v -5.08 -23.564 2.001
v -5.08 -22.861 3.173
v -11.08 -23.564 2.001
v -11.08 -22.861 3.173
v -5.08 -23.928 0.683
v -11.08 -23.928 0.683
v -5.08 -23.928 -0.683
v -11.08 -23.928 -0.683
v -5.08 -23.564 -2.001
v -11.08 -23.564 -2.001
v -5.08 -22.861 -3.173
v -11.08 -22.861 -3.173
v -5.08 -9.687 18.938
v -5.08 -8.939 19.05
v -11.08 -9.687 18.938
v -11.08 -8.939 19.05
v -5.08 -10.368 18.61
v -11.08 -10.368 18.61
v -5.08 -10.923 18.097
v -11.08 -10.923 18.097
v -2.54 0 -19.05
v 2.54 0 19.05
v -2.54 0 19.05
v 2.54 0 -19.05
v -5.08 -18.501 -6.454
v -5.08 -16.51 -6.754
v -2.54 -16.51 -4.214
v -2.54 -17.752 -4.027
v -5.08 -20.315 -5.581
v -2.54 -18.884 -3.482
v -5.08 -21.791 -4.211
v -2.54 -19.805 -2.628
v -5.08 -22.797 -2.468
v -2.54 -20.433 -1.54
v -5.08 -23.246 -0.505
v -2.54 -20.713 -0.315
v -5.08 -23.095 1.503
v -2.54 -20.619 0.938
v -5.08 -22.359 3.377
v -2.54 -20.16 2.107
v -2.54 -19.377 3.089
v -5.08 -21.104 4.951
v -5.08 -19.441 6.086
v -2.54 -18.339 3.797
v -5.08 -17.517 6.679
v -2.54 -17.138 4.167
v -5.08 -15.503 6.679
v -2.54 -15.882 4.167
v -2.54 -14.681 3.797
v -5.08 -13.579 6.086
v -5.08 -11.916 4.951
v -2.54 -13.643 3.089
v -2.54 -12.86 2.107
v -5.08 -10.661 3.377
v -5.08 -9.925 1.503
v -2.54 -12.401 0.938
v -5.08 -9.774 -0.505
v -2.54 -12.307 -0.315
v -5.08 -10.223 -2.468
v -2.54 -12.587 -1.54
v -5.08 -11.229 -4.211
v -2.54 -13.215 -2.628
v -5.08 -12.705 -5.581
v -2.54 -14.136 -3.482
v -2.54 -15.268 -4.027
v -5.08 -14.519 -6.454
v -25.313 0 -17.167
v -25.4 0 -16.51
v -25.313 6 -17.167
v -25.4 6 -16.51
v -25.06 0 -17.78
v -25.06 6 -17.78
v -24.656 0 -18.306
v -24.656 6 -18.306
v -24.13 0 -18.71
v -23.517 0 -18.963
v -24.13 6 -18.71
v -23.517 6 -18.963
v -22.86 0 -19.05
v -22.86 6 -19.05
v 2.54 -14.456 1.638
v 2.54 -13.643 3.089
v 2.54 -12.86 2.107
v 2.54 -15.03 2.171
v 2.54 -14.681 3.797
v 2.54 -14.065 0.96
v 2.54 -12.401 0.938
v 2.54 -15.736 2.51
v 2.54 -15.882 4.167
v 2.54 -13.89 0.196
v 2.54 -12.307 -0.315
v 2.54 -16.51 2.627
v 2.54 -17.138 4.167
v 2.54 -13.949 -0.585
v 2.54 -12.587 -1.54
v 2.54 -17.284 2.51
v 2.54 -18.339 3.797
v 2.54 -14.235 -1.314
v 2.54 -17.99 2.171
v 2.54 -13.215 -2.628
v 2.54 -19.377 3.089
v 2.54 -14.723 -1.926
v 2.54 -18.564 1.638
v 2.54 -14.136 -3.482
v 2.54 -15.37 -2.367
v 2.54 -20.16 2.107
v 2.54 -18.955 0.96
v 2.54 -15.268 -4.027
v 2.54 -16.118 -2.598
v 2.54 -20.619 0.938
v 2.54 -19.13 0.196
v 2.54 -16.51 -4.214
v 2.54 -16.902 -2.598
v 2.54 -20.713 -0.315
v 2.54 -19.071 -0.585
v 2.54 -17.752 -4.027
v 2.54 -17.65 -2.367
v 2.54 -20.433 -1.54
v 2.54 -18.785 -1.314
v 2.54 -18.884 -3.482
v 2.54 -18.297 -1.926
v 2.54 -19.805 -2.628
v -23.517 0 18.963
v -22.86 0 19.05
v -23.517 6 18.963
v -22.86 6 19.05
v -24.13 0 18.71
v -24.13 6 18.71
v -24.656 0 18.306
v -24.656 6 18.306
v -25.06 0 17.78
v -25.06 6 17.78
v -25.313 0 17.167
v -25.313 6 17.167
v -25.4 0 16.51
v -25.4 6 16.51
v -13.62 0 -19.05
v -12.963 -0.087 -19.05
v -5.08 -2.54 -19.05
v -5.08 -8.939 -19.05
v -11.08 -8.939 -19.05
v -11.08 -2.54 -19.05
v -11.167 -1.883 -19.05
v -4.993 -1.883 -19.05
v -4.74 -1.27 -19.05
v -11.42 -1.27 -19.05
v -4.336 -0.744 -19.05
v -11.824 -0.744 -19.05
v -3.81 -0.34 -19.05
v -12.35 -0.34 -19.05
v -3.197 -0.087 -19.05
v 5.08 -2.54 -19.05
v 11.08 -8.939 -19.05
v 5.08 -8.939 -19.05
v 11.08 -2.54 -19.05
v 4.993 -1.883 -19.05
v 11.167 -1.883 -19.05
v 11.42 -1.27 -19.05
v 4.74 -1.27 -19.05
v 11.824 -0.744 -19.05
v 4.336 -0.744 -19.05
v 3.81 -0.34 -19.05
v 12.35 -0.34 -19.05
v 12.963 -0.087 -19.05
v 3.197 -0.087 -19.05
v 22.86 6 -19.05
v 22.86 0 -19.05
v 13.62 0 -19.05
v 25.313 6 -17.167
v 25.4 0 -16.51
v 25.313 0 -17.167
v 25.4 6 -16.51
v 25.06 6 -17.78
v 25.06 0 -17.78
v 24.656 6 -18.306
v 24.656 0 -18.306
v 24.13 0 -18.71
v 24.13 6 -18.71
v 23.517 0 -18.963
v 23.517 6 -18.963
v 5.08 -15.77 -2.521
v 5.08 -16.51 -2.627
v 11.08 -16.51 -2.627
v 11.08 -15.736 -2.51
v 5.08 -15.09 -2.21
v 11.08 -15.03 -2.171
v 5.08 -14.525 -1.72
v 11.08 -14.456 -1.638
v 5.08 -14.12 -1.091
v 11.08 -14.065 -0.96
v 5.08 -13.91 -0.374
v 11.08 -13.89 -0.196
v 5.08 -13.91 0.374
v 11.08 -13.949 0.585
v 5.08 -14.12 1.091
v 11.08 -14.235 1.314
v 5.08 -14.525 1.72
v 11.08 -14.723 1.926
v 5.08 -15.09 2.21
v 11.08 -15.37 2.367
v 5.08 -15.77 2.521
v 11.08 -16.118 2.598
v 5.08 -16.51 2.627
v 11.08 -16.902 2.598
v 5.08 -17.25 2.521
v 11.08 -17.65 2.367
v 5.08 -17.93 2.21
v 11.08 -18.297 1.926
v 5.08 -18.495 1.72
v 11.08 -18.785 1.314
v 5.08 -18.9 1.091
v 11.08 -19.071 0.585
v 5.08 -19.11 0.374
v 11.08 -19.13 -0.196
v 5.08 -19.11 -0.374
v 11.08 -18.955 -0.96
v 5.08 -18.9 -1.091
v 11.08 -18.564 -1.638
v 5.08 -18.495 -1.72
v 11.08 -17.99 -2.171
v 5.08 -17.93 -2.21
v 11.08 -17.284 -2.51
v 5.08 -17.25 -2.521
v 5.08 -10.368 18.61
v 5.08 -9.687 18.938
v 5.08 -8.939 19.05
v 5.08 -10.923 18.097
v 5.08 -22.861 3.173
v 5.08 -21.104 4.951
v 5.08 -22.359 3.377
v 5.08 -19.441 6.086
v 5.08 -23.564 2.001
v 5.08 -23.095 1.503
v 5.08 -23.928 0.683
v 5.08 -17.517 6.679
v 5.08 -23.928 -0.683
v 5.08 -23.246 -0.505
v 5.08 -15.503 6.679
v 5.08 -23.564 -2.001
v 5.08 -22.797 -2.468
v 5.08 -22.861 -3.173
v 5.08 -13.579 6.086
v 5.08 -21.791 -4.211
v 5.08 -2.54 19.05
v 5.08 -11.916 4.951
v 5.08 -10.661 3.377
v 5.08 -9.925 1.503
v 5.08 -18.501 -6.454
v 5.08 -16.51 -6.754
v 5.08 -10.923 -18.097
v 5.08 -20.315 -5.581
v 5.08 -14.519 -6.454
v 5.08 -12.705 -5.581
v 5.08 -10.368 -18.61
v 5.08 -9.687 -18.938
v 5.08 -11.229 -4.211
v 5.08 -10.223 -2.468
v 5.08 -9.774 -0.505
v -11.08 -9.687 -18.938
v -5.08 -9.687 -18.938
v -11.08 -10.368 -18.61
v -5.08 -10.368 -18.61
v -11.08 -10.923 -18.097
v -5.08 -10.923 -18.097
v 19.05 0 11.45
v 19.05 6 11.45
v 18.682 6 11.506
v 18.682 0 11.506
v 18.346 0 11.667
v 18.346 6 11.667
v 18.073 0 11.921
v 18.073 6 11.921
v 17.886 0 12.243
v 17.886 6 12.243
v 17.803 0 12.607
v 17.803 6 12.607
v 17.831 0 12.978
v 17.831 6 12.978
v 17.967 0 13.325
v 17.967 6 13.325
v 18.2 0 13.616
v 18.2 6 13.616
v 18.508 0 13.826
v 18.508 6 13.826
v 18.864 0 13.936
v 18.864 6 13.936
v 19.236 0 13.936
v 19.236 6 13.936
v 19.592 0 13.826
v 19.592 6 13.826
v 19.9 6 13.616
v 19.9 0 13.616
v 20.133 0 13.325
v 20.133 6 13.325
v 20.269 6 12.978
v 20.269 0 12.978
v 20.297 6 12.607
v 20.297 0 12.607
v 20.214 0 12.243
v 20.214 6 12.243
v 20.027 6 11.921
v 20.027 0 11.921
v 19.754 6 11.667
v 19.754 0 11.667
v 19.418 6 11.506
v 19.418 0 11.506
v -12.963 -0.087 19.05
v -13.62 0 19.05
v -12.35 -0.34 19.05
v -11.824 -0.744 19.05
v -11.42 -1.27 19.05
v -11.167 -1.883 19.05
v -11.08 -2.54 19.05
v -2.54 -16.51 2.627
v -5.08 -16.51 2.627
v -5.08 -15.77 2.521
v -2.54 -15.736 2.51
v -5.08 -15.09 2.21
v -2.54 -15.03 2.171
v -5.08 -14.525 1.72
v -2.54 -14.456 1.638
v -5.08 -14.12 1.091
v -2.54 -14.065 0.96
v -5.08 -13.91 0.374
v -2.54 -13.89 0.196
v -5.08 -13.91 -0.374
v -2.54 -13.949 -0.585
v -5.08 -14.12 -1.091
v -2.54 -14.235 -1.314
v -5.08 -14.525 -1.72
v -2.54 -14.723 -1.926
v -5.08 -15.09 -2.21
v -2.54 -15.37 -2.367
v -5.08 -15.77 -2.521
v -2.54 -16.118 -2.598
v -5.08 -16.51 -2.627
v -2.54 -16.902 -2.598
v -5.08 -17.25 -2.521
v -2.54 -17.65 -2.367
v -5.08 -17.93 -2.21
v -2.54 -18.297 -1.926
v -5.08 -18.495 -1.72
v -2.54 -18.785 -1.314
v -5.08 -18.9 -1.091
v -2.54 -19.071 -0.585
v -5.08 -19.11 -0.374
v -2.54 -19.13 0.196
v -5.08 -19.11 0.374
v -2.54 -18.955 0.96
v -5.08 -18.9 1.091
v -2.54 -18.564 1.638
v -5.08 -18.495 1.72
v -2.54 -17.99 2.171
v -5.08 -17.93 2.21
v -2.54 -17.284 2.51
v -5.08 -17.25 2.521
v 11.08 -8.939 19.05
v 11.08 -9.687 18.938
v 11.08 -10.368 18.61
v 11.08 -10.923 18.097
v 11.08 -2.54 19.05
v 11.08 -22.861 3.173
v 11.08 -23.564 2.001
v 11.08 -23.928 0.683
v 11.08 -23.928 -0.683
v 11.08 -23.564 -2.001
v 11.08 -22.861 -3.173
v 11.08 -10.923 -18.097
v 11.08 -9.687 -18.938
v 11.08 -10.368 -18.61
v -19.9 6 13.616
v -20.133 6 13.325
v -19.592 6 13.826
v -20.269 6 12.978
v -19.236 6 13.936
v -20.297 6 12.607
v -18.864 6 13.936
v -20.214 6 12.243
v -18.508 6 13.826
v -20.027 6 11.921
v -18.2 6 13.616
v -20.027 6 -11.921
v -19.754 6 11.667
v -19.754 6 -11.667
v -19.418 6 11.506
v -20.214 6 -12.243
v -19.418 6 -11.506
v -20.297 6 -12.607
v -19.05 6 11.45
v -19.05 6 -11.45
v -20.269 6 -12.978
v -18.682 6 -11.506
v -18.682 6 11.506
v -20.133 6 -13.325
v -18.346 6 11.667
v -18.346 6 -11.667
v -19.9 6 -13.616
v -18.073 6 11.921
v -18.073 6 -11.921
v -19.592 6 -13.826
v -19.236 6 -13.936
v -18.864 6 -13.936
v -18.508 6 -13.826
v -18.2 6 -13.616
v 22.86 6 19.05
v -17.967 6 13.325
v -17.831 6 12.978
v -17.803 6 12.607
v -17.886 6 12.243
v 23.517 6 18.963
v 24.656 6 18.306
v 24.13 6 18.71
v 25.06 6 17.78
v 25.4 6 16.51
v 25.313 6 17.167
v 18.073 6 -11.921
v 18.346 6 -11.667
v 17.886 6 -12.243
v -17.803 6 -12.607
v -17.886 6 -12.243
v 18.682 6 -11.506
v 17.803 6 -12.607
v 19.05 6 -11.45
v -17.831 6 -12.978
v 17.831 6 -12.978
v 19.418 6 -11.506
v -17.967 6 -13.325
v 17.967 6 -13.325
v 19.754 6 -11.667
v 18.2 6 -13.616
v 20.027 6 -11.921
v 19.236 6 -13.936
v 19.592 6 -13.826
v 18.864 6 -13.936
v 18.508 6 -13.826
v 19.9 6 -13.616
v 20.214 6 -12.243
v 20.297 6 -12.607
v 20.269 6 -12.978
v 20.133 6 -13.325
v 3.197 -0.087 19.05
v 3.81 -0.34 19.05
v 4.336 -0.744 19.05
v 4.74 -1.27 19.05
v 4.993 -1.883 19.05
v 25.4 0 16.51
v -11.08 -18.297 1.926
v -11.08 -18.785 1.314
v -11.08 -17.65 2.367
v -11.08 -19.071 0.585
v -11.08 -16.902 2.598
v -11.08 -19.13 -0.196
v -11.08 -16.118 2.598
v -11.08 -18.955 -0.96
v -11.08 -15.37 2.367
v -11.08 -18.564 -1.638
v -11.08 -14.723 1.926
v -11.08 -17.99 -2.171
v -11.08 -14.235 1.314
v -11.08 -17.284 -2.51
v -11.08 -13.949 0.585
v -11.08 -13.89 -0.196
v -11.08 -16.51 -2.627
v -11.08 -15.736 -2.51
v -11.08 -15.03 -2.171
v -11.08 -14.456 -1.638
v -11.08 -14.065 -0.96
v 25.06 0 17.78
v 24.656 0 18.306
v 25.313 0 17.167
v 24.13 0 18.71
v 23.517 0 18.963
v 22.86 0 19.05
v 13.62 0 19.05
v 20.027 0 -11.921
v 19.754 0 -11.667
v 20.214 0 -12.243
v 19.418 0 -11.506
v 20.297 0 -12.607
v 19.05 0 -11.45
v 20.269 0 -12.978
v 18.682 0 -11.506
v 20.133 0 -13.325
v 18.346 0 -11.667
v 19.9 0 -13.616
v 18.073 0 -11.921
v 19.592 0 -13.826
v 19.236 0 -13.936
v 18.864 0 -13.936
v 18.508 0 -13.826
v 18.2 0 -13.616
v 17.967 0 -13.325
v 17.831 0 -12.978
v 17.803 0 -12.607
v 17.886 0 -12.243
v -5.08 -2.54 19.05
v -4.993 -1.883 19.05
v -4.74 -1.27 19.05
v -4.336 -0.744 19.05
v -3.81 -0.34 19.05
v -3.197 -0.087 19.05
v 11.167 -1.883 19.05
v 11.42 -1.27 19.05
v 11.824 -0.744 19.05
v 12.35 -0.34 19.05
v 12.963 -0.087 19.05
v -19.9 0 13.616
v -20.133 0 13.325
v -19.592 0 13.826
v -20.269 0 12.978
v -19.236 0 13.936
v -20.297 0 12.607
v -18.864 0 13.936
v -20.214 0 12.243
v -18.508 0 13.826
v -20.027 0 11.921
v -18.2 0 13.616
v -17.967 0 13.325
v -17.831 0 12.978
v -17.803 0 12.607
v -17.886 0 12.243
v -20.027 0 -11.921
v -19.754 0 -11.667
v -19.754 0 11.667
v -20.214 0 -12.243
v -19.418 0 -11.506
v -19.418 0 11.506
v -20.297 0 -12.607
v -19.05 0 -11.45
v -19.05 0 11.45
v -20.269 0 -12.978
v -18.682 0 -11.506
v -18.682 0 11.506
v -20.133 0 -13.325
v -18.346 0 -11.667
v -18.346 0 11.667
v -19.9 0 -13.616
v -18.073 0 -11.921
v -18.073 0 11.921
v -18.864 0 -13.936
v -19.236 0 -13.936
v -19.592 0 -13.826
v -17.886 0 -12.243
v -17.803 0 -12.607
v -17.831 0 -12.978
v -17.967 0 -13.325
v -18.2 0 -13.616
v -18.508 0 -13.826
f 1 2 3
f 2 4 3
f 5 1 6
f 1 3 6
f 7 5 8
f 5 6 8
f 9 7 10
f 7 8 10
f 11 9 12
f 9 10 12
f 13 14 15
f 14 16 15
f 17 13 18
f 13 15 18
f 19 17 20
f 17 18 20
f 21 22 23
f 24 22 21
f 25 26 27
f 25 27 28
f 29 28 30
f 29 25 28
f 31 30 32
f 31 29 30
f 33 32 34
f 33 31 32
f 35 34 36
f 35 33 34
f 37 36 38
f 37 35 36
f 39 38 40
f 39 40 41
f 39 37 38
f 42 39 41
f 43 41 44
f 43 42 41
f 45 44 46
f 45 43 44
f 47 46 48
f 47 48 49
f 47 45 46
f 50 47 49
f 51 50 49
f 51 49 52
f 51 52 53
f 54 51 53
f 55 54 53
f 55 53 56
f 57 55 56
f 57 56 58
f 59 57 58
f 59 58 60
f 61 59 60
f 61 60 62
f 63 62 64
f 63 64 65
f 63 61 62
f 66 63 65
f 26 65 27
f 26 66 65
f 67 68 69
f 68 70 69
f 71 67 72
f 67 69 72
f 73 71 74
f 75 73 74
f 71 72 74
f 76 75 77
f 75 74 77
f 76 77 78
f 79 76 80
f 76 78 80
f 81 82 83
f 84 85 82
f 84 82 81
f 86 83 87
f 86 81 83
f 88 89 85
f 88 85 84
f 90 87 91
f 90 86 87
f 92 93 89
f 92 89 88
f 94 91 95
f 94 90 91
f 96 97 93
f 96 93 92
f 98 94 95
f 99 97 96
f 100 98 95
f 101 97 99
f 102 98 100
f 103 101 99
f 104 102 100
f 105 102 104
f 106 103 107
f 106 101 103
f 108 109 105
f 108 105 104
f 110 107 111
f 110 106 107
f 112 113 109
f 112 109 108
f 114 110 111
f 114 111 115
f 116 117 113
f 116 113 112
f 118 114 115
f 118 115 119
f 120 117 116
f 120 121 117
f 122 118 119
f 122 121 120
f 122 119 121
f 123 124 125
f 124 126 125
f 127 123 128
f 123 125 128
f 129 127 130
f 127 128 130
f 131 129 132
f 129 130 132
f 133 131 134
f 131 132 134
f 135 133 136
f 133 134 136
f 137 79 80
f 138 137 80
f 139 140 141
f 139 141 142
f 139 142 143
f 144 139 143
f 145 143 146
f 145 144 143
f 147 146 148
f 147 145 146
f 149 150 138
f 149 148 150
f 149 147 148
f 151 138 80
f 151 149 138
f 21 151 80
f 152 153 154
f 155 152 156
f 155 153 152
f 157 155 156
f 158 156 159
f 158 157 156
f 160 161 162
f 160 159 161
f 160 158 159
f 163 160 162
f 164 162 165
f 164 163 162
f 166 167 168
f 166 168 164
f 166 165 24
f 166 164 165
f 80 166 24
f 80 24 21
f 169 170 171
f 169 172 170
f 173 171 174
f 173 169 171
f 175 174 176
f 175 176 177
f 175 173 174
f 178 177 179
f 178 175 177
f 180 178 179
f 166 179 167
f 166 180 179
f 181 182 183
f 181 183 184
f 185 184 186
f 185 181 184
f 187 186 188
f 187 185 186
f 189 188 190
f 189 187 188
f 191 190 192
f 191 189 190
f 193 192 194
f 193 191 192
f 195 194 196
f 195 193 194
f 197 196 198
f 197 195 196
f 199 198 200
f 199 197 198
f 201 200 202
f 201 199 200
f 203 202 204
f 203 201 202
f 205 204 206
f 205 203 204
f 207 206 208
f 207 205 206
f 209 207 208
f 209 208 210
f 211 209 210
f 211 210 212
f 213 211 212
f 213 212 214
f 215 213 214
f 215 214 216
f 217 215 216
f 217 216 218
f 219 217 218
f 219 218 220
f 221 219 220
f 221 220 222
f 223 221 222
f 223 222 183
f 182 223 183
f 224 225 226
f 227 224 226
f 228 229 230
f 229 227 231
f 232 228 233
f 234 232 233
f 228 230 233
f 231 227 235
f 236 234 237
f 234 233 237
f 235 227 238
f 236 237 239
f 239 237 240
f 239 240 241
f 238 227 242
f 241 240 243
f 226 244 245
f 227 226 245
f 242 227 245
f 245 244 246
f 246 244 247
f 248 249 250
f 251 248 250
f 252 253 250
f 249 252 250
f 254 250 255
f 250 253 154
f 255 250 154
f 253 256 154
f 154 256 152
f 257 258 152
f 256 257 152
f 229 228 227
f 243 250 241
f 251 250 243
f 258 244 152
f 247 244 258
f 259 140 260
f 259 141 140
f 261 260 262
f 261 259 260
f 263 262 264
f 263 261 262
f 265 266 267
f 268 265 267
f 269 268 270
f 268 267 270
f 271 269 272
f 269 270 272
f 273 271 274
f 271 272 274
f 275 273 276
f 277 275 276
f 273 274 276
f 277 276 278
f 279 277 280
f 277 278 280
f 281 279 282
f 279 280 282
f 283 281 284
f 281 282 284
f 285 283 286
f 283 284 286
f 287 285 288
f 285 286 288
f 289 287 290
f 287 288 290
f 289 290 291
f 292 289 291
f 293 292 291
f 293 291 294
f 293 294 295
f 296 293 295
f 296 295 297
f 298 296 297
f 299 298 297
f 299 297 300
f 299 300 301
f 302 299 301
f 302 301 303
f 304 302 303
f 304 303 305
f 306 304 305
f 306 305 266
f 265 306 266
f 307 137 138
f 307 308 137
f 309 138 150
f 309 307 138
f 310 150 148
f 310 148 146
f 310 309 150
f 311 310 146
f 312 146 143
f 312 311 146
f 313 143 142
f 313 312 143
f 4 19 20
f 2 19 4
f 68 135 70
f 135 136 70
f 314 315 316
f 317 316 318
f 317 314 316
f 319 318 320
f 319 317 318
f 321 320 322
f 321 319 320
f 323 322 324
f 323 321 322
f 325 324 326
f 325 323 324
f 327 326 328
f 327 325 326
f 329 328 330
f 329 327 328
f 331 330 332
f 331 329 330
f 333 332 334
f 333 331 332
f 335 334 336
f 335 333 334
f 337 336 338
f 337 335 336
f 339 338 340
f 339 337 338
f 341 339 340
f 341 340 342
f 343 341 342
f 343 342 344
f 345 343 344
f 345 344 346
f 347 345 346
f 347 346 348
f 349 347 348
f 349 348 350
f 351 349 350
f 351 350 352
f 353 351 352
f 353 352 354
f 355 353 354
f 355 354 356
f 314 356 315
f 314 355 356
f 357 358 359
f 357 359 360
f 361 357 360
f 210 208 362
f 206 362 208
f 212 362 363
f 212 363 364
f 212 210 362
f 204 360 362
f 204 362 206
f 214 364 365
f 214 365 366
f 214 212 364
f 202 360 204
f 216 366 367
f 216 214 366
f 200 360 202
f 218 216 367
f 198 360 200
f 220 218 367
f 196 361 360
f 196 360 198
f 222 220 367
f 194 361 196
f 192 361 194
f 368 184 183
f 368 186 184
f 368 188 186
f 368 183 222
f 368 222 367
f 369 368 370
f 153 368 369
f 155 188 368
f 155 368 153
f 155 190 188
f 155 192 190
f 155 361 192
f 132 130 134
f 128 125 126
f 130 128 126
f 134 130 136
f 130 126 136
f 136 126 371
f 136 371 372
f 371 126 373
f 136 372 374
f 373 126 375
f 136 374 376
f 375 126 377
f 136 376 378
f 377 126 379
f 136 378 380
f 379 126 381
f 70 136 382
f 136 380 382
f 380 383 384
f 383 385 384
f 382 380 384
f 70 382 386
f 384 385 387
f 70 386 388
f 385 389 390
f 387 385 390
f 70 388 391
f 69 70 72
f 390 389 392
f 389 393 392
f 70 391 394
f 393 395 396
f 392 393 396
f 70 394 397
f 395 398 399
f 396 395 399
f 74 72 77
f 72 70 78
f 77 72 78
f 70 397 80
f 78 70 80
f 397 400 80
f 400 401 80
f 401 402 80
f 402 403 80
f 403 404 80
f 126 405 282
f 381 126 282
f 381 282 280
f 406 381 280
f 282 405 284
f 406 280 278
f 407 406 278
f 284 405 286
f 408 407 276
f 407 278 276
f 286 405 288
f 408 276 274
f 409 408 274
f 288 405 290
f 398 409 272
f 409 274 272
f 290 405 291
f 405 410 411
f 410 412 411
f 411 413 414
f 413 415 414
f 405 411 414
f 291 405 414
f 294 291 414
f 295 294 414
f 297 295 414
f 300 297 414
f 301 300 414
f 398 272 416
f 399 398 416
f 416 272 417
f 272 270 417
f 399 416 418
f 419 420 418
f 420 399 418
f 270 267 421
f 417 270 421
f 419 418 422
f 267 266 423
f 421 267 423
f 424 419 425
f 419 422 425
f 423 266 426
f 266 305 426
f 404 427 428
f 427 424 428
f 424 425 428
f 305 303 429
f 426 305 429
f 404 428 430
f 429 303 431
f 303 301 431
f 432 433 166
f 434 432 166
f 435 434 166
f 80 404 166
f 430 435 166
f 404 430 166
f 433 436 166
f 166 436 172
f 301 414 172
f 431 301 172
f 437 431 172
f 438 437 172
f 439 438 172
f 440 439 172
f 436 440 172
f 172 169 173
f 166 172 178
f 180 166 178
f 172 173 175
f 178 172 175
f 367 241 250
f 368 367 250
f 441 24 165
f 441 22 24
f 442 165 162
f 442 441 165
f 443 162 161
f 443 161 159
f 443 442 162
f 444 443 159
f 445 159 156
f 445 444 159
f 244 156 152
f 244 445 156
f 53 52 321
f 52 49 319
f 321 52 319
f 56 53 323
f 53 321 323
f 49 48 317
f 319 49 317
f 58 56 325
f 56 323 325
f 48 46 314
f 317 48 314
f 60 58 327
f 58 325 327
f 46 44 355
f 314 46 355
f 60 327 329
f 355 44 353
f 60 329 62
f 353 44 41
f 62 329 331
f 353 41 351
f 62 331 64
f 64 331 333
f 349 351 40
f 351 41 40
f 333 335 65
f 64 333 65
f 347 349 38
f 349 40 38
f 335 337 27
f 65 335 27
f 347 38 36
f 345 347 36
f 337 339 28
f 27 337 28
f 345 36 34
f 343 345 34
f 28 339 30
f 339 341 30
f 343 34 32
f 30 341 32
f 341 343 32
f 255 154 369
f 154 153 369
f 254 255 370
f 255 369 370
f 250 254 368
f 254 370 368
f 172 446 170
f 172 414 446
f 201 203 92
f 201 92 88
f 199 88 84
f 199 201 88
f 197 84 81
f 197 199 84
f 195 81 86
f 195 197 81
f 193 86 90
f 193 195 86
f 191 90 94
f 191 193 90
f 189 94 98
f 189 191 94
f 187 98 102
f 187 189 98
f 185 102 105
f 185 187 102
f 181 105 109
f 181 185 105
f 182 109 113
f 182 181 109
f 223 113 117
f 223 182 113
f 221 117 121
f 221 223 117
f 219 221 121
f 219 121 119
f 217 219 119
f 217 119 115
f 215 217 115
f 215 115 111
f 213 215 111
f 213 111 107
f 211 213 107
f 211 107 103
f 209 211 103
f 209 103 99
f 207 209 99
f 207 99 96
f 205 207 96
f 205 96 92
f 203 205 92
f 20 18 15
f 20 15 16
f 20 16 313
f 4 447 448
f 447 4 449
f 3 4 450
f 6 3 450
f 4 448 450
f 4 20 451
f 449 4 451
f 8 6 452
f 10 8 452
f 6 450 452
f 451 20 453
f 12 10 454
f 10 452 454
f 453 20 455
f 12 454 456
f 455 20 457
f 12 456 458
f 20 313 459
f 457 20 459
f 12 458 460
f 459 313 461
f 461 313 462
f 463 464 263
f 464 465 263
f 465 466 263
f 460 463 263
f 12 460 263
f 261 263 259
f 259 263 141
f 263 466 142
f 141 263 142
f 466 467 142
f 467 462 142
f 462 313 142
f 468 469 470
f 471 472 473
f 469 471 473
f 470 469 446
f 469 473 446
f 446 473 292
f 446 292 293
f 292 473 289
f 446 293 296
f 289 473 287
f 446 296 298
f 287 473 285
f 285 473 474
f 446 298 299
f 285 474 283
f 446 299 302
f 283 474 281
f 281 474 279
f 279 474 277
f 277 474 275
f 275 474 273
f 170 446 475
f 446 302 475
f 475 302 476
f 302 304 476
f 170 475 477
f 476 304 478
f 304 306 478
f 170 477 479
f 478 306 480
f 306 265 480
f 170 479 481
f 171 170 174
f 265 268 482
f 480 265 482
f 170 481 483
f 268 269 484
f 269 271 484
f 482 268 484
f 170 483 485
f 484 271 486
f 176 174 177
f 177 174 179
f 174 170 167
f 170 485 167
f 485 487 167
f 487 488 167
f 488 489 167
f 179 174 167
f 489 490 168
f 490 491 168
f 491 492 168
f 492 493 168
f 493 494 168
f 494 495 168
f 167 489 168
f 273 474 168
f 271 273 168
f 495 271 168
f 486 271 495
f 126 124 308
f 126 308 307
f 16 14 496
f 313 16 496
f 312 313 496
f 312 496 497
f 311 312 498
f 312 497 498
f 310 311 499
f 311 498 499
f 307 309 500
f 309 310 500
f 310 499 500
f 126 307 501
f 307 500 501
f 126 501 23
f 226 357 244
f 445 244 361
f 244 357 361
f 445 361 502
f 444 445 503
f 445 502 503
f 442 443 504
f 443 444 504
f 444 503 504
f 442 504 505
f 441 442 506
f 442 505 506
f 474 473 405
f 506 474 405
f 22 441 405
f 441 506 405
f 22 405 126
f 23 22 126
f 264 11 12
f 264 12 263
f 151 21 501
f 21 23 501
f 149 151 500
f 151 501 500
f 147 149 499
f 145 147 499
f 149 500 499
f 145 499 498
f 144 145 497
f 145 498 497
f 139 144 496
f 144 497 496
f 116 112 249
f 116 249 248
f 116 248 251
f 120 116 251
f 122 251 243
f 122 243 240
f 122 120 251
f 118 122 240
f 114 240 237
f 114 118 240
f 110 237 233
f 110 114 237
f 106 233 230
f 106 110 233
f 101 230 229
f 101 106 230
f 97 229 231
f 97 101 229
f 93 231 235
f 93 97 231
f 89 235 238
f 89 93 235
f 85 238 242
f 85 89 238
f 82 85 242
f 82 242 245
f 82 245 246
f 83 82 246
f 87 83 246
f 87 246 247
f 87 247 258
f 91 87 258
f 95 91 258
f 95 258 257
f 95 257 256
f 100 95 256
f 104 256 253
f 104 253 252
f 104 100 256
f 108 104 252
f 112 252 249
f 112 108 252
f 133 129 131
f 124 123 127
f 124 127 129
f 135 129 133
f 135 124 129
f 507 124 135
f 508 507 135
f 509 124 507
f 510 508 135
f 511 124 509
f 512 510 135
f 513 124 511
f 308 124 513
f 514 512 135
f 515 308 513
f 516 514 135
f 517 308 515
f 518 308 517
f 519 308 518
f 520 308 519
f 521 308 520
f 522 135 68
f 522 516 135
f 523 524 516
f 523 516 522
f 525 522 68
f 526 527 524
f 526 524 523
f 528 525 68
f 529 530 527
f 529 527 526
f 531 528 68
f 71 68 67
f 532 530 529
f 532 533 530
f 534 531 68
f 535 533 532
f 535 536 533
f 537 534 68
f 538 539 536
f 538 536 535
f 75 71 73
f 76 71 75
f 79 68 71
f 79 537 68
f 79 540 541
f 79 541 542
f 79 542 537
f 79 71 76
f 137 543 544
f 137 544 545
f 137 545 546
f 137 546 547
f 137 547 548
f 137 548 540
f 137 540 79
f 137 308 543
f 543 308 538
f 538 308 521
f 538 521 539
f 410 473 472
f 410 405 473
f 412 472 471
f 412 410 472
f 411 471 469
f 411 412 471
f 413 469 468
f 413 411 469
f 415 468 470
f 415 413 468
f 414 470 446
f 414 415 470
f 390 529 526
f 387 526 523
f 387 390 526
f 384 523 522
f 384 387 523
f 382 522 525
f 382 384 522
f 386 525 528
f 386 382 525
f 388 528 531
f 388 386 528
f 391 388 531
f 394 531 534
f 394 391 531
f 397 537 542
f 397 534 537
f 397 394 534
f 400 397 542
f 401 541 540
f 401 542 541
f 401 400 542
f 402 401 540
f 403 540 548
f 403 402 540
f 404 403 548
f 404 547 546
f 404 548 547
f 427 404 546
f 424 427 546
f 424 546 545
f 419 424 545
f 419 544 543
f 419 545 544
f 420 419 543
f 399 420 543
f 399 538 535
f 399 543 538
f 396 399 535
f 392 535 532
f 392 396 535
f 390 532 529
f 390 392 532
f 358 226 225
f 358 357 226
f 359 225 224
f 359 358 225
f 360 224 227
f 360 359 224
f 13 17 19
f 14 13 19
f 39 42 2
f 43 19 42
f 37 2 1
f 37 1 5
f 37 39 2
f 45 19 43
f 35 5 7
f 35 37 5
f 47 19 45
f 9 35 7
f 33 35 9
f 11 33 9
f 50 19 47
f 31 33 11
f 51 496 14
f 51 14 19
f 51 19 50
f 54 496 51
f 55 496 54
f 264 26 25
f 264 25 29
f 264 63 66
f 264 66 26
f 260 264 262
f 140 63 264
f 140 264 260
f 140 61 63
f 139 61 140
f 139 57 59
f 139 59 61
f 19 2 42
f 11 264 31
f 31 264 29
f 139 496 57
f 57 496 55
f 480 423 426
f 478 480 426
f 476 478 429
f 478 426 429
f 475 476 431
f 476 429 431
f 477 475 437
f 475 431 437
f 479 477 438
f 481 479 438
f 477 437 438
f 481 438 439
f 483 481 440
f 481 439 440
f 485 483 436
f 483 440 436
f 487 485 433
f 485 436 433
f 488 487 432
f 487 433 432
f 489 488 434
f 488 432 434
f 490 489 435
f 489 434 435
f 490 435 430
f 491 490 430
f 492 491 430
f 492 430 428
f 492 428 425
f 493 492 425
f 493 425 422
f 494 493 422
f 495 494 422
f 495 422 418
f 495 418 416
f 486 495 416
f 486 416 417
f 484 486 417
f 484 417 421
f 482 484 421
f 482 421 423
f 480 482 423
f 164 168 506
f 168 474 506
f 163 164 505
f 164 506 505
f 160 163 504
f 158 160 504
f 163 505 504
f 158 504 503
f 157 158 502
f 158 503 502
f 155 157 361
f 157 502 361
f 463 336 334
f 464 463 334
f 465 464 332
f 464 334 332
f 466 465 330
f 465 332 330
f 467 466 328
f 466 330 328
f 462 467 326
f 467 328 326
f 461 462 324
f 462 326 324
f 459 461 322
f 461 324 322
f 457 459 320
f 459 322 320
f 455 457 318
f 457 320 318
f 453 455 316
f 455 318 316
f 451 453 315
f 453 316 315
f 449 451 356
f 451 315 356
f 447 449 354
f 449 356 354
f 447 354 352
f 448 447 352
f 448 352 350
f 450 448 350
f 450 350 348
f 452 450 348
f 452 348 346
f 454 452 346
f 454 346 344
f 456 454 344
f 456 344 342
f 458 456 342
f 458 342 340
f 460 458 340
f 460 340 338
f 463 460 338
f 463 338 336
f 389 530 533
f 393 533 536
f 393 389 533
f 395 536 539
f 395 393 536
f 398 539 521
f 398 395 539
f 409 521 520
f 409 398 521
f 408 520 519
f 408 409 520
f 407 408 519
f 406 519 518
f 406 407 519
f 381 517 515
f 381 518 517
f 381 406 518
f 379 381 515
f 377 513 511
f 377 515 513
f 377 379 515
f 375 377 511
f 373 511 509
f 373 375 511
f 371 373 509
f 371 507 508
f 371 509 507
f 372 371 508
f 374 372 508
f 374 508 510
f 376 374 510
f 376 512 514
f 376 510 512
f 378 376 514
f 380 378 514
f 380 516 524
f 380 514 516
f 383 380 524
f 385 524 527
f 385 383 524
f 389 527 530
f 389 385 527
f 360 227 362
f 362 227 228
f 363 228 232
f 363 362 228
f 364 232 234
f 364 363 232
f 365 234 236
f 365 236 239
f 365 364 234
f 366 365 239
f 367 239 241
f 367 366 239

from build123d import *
from OCP.BRepFilletAPI import BRepFilletAPI_MakeFillet

# Parameters (mm, degrees)
SKETCH1_R           = 2.627
BOSS_EXTRUDE1_DEPTH = 6
BOSS_EXTRUDE2_START = -5.08
SKETCH1_3_W         = 38.1
SKETCH1_3_H         = 5.999999938
BOSS_EXTRUDE2_DEPTH = 25.4
SKETCH3_R           = 1.25
CUT_EXTRUDE1_DEPTH  = 45.654479015
FILLET1_R1          = 2.54
FILLET1_R2          = 5.08
SKETCH4_R           = 4.2145
SKETCH4_R_2         = 2.627
BOSS_EXTRUDE3_DEPTH = 2.54
BOSS_EXTRUDE4_START = 7.62
SKETCH4_2_R         = 4.2145
SKETCH4_2_R_2       = 2.627
BOSS_EXTRUDE4_DEPTH = 2.54
CHAMFER2_SIZE       = 2.54


with BuildPart() as part:
    # Sketch1 → Boss-Extrude1 (new body)
    with BuildSketch(Plane(origin=(5.08, 0, 0), x_dir=(0, 0, -1), z_dir=(1, 0, 0))):
        Polygon((-19.05, 0), (-19.05, -10.16), (0, -25.4), (19.05, -10.16), (19.05, 0), align=None)
        with Locations((0, -16.51)):
            Circle(SKETCH1_R, mode=Mode.SUBTRACT)
    boss_extrude1 = extrude(amount=BOSS_EXTRUDE1_DEPTH)

    # Sketch1<3> → Boss-Extrude2 (add)
    with BuildSketch(Plane(origin=(5.08, 0, 0), x_dir=(0, 0, -1), z_dir=(1, 0, 0)).offset(BOSS_EXTRUDE2_START)):
        with Locations((0, 2.999999969)):
            Rectangle(SKETCH1_3_W, SKETCH1_3_H)
    boss_extrude2 = extrude(amount=BOSS_EXTRUDE2_DEPTH)

    # Sketch3 → Cut-Extrude1 (cut, through all)
    with BuildSketch(Plane(origin=(0, 5.999999938, 0), x_dir=(1, 0, 0), z_dir=(0, 1, 0))):
        with Locations(Location((19.05, 12.7, 0), (0, 0, 270))):
            Circle(SKETCH3_R)
        with Locations(Location((19.05, -12.7, 0), (0, 0, 90))):
            Circle(SKETCH3_R)
    cut_extrude1 = extrude(amount=-CUT_EXTRUDE1_DEPTH, mode=Mode.SUBTRACT)

    # Mirror2: Boss-Extrude2, Cut-Extrude1 across plane
    add(boss_extrude2.mirror(Plane(origin=(0, 0, 0), x_dir=(0, 0, 1), z_dir=(1, 0, 0))))
    add(cut_extrude1.mirror(Plane(origin=(0, 0, 0), x_dir=(0, 0, 1), z_dir=(1, 0, 0))), mode=Mode.SUBTRACT)

    # Mirror3: Boss-Extrude1 across plane
    add(boss_extrude1.mirror(Plane(origin=(0, 0, 0), x_dir=(0, 0, 1), z_dir=(1, 0, 0))))

    # Fillet1: one fillet with a radius per group of edges: ONE call of the kernel's fillet builder (fillet() takes one radius for all edges)
    fillet1_edges_1 = [part.edges().sort_by_distance(p)[0] for p in [
        (8.08, -10.16, 19.05),
        (8.08, -10.16, -19.05),
        (11.08, 0, 0),
        (25.4, 2.999999969, 19.05),
        (25.4, 2.999999969, -19.05),
        (-25.4, 2.999999969, -19.05),
        (-25.4, 2.999999969, 19.05),
        (-8.08, -10.16, -19.05),
        (-8.08, -10.16, 19.05),
        (-5.08, 0, 0),
        (-11.08, 0, 0),
        (5.08, 0, 0),
    ]]
    fillet1_edges_2 = [part.edges().sort_by_distance(p)[0] for p in [
        (8.08, -25.4, 0),
        (-8.08, -25.4, 0),
    ]]
    fillet1 = BRepFilletAPI_MakeFillet(part.part.solid().wrapped)
    for e in fillet1_edges_1:
        fillet1.Add(FILLET1_R1, e.wrapped)
    for e in fillet1_edges_2:
        fillet1.Add(FILLET1_R2, e.wrapped)
    add(Compound.cast(fillet1.Shape()), mode=Mode.REPLACE)

    # Sketch4 → Boss-Extrude3 (add)
    with BuildSketch(Plane.ZY.offset(-5.08)):
        with Locations(Location((0, -16.51, 0), (0, 0, 180))):
            Circle(SKETCH4_R)
        with Locations((0, -16.51)):
            Circle(SKETCH4_R_2, mode=Mode.SUBTRACT)
    extrude(amount=BOSS_EXTRUDE3_DEPTH)

    # Sketch4<2> → Boss-Extrude4 (add)
    with BuildSketch(Plane.ZY.offset(-5.08).offset(BOSS_EXTRUDE4_START)):
        with Locations(Location((0, -16.51, 0), (0, 0, 180))):
            Circle(SKETCH4_2_R)
        with Locations((0, -16.51)):
            Circle(SKETCH4_2_R_2, mode=Mode.SUBTRACT)
    extrude(amount=BOSS_EXTRUDE4_DEPTH)

    # Chamfer2
    chamfer2_edges = [part.edges().sort_by_distance(p)[0] for p in [
        (5.08, -16.51, 4.2145),
        (-5.08, -16.51, 4.2145),
    ]]
    chamfer(chamfer2_edges, length=CHAMFER2_SIZE - 0.0001)  # a hair under: the kernel refuses the full size


solid = part.part
